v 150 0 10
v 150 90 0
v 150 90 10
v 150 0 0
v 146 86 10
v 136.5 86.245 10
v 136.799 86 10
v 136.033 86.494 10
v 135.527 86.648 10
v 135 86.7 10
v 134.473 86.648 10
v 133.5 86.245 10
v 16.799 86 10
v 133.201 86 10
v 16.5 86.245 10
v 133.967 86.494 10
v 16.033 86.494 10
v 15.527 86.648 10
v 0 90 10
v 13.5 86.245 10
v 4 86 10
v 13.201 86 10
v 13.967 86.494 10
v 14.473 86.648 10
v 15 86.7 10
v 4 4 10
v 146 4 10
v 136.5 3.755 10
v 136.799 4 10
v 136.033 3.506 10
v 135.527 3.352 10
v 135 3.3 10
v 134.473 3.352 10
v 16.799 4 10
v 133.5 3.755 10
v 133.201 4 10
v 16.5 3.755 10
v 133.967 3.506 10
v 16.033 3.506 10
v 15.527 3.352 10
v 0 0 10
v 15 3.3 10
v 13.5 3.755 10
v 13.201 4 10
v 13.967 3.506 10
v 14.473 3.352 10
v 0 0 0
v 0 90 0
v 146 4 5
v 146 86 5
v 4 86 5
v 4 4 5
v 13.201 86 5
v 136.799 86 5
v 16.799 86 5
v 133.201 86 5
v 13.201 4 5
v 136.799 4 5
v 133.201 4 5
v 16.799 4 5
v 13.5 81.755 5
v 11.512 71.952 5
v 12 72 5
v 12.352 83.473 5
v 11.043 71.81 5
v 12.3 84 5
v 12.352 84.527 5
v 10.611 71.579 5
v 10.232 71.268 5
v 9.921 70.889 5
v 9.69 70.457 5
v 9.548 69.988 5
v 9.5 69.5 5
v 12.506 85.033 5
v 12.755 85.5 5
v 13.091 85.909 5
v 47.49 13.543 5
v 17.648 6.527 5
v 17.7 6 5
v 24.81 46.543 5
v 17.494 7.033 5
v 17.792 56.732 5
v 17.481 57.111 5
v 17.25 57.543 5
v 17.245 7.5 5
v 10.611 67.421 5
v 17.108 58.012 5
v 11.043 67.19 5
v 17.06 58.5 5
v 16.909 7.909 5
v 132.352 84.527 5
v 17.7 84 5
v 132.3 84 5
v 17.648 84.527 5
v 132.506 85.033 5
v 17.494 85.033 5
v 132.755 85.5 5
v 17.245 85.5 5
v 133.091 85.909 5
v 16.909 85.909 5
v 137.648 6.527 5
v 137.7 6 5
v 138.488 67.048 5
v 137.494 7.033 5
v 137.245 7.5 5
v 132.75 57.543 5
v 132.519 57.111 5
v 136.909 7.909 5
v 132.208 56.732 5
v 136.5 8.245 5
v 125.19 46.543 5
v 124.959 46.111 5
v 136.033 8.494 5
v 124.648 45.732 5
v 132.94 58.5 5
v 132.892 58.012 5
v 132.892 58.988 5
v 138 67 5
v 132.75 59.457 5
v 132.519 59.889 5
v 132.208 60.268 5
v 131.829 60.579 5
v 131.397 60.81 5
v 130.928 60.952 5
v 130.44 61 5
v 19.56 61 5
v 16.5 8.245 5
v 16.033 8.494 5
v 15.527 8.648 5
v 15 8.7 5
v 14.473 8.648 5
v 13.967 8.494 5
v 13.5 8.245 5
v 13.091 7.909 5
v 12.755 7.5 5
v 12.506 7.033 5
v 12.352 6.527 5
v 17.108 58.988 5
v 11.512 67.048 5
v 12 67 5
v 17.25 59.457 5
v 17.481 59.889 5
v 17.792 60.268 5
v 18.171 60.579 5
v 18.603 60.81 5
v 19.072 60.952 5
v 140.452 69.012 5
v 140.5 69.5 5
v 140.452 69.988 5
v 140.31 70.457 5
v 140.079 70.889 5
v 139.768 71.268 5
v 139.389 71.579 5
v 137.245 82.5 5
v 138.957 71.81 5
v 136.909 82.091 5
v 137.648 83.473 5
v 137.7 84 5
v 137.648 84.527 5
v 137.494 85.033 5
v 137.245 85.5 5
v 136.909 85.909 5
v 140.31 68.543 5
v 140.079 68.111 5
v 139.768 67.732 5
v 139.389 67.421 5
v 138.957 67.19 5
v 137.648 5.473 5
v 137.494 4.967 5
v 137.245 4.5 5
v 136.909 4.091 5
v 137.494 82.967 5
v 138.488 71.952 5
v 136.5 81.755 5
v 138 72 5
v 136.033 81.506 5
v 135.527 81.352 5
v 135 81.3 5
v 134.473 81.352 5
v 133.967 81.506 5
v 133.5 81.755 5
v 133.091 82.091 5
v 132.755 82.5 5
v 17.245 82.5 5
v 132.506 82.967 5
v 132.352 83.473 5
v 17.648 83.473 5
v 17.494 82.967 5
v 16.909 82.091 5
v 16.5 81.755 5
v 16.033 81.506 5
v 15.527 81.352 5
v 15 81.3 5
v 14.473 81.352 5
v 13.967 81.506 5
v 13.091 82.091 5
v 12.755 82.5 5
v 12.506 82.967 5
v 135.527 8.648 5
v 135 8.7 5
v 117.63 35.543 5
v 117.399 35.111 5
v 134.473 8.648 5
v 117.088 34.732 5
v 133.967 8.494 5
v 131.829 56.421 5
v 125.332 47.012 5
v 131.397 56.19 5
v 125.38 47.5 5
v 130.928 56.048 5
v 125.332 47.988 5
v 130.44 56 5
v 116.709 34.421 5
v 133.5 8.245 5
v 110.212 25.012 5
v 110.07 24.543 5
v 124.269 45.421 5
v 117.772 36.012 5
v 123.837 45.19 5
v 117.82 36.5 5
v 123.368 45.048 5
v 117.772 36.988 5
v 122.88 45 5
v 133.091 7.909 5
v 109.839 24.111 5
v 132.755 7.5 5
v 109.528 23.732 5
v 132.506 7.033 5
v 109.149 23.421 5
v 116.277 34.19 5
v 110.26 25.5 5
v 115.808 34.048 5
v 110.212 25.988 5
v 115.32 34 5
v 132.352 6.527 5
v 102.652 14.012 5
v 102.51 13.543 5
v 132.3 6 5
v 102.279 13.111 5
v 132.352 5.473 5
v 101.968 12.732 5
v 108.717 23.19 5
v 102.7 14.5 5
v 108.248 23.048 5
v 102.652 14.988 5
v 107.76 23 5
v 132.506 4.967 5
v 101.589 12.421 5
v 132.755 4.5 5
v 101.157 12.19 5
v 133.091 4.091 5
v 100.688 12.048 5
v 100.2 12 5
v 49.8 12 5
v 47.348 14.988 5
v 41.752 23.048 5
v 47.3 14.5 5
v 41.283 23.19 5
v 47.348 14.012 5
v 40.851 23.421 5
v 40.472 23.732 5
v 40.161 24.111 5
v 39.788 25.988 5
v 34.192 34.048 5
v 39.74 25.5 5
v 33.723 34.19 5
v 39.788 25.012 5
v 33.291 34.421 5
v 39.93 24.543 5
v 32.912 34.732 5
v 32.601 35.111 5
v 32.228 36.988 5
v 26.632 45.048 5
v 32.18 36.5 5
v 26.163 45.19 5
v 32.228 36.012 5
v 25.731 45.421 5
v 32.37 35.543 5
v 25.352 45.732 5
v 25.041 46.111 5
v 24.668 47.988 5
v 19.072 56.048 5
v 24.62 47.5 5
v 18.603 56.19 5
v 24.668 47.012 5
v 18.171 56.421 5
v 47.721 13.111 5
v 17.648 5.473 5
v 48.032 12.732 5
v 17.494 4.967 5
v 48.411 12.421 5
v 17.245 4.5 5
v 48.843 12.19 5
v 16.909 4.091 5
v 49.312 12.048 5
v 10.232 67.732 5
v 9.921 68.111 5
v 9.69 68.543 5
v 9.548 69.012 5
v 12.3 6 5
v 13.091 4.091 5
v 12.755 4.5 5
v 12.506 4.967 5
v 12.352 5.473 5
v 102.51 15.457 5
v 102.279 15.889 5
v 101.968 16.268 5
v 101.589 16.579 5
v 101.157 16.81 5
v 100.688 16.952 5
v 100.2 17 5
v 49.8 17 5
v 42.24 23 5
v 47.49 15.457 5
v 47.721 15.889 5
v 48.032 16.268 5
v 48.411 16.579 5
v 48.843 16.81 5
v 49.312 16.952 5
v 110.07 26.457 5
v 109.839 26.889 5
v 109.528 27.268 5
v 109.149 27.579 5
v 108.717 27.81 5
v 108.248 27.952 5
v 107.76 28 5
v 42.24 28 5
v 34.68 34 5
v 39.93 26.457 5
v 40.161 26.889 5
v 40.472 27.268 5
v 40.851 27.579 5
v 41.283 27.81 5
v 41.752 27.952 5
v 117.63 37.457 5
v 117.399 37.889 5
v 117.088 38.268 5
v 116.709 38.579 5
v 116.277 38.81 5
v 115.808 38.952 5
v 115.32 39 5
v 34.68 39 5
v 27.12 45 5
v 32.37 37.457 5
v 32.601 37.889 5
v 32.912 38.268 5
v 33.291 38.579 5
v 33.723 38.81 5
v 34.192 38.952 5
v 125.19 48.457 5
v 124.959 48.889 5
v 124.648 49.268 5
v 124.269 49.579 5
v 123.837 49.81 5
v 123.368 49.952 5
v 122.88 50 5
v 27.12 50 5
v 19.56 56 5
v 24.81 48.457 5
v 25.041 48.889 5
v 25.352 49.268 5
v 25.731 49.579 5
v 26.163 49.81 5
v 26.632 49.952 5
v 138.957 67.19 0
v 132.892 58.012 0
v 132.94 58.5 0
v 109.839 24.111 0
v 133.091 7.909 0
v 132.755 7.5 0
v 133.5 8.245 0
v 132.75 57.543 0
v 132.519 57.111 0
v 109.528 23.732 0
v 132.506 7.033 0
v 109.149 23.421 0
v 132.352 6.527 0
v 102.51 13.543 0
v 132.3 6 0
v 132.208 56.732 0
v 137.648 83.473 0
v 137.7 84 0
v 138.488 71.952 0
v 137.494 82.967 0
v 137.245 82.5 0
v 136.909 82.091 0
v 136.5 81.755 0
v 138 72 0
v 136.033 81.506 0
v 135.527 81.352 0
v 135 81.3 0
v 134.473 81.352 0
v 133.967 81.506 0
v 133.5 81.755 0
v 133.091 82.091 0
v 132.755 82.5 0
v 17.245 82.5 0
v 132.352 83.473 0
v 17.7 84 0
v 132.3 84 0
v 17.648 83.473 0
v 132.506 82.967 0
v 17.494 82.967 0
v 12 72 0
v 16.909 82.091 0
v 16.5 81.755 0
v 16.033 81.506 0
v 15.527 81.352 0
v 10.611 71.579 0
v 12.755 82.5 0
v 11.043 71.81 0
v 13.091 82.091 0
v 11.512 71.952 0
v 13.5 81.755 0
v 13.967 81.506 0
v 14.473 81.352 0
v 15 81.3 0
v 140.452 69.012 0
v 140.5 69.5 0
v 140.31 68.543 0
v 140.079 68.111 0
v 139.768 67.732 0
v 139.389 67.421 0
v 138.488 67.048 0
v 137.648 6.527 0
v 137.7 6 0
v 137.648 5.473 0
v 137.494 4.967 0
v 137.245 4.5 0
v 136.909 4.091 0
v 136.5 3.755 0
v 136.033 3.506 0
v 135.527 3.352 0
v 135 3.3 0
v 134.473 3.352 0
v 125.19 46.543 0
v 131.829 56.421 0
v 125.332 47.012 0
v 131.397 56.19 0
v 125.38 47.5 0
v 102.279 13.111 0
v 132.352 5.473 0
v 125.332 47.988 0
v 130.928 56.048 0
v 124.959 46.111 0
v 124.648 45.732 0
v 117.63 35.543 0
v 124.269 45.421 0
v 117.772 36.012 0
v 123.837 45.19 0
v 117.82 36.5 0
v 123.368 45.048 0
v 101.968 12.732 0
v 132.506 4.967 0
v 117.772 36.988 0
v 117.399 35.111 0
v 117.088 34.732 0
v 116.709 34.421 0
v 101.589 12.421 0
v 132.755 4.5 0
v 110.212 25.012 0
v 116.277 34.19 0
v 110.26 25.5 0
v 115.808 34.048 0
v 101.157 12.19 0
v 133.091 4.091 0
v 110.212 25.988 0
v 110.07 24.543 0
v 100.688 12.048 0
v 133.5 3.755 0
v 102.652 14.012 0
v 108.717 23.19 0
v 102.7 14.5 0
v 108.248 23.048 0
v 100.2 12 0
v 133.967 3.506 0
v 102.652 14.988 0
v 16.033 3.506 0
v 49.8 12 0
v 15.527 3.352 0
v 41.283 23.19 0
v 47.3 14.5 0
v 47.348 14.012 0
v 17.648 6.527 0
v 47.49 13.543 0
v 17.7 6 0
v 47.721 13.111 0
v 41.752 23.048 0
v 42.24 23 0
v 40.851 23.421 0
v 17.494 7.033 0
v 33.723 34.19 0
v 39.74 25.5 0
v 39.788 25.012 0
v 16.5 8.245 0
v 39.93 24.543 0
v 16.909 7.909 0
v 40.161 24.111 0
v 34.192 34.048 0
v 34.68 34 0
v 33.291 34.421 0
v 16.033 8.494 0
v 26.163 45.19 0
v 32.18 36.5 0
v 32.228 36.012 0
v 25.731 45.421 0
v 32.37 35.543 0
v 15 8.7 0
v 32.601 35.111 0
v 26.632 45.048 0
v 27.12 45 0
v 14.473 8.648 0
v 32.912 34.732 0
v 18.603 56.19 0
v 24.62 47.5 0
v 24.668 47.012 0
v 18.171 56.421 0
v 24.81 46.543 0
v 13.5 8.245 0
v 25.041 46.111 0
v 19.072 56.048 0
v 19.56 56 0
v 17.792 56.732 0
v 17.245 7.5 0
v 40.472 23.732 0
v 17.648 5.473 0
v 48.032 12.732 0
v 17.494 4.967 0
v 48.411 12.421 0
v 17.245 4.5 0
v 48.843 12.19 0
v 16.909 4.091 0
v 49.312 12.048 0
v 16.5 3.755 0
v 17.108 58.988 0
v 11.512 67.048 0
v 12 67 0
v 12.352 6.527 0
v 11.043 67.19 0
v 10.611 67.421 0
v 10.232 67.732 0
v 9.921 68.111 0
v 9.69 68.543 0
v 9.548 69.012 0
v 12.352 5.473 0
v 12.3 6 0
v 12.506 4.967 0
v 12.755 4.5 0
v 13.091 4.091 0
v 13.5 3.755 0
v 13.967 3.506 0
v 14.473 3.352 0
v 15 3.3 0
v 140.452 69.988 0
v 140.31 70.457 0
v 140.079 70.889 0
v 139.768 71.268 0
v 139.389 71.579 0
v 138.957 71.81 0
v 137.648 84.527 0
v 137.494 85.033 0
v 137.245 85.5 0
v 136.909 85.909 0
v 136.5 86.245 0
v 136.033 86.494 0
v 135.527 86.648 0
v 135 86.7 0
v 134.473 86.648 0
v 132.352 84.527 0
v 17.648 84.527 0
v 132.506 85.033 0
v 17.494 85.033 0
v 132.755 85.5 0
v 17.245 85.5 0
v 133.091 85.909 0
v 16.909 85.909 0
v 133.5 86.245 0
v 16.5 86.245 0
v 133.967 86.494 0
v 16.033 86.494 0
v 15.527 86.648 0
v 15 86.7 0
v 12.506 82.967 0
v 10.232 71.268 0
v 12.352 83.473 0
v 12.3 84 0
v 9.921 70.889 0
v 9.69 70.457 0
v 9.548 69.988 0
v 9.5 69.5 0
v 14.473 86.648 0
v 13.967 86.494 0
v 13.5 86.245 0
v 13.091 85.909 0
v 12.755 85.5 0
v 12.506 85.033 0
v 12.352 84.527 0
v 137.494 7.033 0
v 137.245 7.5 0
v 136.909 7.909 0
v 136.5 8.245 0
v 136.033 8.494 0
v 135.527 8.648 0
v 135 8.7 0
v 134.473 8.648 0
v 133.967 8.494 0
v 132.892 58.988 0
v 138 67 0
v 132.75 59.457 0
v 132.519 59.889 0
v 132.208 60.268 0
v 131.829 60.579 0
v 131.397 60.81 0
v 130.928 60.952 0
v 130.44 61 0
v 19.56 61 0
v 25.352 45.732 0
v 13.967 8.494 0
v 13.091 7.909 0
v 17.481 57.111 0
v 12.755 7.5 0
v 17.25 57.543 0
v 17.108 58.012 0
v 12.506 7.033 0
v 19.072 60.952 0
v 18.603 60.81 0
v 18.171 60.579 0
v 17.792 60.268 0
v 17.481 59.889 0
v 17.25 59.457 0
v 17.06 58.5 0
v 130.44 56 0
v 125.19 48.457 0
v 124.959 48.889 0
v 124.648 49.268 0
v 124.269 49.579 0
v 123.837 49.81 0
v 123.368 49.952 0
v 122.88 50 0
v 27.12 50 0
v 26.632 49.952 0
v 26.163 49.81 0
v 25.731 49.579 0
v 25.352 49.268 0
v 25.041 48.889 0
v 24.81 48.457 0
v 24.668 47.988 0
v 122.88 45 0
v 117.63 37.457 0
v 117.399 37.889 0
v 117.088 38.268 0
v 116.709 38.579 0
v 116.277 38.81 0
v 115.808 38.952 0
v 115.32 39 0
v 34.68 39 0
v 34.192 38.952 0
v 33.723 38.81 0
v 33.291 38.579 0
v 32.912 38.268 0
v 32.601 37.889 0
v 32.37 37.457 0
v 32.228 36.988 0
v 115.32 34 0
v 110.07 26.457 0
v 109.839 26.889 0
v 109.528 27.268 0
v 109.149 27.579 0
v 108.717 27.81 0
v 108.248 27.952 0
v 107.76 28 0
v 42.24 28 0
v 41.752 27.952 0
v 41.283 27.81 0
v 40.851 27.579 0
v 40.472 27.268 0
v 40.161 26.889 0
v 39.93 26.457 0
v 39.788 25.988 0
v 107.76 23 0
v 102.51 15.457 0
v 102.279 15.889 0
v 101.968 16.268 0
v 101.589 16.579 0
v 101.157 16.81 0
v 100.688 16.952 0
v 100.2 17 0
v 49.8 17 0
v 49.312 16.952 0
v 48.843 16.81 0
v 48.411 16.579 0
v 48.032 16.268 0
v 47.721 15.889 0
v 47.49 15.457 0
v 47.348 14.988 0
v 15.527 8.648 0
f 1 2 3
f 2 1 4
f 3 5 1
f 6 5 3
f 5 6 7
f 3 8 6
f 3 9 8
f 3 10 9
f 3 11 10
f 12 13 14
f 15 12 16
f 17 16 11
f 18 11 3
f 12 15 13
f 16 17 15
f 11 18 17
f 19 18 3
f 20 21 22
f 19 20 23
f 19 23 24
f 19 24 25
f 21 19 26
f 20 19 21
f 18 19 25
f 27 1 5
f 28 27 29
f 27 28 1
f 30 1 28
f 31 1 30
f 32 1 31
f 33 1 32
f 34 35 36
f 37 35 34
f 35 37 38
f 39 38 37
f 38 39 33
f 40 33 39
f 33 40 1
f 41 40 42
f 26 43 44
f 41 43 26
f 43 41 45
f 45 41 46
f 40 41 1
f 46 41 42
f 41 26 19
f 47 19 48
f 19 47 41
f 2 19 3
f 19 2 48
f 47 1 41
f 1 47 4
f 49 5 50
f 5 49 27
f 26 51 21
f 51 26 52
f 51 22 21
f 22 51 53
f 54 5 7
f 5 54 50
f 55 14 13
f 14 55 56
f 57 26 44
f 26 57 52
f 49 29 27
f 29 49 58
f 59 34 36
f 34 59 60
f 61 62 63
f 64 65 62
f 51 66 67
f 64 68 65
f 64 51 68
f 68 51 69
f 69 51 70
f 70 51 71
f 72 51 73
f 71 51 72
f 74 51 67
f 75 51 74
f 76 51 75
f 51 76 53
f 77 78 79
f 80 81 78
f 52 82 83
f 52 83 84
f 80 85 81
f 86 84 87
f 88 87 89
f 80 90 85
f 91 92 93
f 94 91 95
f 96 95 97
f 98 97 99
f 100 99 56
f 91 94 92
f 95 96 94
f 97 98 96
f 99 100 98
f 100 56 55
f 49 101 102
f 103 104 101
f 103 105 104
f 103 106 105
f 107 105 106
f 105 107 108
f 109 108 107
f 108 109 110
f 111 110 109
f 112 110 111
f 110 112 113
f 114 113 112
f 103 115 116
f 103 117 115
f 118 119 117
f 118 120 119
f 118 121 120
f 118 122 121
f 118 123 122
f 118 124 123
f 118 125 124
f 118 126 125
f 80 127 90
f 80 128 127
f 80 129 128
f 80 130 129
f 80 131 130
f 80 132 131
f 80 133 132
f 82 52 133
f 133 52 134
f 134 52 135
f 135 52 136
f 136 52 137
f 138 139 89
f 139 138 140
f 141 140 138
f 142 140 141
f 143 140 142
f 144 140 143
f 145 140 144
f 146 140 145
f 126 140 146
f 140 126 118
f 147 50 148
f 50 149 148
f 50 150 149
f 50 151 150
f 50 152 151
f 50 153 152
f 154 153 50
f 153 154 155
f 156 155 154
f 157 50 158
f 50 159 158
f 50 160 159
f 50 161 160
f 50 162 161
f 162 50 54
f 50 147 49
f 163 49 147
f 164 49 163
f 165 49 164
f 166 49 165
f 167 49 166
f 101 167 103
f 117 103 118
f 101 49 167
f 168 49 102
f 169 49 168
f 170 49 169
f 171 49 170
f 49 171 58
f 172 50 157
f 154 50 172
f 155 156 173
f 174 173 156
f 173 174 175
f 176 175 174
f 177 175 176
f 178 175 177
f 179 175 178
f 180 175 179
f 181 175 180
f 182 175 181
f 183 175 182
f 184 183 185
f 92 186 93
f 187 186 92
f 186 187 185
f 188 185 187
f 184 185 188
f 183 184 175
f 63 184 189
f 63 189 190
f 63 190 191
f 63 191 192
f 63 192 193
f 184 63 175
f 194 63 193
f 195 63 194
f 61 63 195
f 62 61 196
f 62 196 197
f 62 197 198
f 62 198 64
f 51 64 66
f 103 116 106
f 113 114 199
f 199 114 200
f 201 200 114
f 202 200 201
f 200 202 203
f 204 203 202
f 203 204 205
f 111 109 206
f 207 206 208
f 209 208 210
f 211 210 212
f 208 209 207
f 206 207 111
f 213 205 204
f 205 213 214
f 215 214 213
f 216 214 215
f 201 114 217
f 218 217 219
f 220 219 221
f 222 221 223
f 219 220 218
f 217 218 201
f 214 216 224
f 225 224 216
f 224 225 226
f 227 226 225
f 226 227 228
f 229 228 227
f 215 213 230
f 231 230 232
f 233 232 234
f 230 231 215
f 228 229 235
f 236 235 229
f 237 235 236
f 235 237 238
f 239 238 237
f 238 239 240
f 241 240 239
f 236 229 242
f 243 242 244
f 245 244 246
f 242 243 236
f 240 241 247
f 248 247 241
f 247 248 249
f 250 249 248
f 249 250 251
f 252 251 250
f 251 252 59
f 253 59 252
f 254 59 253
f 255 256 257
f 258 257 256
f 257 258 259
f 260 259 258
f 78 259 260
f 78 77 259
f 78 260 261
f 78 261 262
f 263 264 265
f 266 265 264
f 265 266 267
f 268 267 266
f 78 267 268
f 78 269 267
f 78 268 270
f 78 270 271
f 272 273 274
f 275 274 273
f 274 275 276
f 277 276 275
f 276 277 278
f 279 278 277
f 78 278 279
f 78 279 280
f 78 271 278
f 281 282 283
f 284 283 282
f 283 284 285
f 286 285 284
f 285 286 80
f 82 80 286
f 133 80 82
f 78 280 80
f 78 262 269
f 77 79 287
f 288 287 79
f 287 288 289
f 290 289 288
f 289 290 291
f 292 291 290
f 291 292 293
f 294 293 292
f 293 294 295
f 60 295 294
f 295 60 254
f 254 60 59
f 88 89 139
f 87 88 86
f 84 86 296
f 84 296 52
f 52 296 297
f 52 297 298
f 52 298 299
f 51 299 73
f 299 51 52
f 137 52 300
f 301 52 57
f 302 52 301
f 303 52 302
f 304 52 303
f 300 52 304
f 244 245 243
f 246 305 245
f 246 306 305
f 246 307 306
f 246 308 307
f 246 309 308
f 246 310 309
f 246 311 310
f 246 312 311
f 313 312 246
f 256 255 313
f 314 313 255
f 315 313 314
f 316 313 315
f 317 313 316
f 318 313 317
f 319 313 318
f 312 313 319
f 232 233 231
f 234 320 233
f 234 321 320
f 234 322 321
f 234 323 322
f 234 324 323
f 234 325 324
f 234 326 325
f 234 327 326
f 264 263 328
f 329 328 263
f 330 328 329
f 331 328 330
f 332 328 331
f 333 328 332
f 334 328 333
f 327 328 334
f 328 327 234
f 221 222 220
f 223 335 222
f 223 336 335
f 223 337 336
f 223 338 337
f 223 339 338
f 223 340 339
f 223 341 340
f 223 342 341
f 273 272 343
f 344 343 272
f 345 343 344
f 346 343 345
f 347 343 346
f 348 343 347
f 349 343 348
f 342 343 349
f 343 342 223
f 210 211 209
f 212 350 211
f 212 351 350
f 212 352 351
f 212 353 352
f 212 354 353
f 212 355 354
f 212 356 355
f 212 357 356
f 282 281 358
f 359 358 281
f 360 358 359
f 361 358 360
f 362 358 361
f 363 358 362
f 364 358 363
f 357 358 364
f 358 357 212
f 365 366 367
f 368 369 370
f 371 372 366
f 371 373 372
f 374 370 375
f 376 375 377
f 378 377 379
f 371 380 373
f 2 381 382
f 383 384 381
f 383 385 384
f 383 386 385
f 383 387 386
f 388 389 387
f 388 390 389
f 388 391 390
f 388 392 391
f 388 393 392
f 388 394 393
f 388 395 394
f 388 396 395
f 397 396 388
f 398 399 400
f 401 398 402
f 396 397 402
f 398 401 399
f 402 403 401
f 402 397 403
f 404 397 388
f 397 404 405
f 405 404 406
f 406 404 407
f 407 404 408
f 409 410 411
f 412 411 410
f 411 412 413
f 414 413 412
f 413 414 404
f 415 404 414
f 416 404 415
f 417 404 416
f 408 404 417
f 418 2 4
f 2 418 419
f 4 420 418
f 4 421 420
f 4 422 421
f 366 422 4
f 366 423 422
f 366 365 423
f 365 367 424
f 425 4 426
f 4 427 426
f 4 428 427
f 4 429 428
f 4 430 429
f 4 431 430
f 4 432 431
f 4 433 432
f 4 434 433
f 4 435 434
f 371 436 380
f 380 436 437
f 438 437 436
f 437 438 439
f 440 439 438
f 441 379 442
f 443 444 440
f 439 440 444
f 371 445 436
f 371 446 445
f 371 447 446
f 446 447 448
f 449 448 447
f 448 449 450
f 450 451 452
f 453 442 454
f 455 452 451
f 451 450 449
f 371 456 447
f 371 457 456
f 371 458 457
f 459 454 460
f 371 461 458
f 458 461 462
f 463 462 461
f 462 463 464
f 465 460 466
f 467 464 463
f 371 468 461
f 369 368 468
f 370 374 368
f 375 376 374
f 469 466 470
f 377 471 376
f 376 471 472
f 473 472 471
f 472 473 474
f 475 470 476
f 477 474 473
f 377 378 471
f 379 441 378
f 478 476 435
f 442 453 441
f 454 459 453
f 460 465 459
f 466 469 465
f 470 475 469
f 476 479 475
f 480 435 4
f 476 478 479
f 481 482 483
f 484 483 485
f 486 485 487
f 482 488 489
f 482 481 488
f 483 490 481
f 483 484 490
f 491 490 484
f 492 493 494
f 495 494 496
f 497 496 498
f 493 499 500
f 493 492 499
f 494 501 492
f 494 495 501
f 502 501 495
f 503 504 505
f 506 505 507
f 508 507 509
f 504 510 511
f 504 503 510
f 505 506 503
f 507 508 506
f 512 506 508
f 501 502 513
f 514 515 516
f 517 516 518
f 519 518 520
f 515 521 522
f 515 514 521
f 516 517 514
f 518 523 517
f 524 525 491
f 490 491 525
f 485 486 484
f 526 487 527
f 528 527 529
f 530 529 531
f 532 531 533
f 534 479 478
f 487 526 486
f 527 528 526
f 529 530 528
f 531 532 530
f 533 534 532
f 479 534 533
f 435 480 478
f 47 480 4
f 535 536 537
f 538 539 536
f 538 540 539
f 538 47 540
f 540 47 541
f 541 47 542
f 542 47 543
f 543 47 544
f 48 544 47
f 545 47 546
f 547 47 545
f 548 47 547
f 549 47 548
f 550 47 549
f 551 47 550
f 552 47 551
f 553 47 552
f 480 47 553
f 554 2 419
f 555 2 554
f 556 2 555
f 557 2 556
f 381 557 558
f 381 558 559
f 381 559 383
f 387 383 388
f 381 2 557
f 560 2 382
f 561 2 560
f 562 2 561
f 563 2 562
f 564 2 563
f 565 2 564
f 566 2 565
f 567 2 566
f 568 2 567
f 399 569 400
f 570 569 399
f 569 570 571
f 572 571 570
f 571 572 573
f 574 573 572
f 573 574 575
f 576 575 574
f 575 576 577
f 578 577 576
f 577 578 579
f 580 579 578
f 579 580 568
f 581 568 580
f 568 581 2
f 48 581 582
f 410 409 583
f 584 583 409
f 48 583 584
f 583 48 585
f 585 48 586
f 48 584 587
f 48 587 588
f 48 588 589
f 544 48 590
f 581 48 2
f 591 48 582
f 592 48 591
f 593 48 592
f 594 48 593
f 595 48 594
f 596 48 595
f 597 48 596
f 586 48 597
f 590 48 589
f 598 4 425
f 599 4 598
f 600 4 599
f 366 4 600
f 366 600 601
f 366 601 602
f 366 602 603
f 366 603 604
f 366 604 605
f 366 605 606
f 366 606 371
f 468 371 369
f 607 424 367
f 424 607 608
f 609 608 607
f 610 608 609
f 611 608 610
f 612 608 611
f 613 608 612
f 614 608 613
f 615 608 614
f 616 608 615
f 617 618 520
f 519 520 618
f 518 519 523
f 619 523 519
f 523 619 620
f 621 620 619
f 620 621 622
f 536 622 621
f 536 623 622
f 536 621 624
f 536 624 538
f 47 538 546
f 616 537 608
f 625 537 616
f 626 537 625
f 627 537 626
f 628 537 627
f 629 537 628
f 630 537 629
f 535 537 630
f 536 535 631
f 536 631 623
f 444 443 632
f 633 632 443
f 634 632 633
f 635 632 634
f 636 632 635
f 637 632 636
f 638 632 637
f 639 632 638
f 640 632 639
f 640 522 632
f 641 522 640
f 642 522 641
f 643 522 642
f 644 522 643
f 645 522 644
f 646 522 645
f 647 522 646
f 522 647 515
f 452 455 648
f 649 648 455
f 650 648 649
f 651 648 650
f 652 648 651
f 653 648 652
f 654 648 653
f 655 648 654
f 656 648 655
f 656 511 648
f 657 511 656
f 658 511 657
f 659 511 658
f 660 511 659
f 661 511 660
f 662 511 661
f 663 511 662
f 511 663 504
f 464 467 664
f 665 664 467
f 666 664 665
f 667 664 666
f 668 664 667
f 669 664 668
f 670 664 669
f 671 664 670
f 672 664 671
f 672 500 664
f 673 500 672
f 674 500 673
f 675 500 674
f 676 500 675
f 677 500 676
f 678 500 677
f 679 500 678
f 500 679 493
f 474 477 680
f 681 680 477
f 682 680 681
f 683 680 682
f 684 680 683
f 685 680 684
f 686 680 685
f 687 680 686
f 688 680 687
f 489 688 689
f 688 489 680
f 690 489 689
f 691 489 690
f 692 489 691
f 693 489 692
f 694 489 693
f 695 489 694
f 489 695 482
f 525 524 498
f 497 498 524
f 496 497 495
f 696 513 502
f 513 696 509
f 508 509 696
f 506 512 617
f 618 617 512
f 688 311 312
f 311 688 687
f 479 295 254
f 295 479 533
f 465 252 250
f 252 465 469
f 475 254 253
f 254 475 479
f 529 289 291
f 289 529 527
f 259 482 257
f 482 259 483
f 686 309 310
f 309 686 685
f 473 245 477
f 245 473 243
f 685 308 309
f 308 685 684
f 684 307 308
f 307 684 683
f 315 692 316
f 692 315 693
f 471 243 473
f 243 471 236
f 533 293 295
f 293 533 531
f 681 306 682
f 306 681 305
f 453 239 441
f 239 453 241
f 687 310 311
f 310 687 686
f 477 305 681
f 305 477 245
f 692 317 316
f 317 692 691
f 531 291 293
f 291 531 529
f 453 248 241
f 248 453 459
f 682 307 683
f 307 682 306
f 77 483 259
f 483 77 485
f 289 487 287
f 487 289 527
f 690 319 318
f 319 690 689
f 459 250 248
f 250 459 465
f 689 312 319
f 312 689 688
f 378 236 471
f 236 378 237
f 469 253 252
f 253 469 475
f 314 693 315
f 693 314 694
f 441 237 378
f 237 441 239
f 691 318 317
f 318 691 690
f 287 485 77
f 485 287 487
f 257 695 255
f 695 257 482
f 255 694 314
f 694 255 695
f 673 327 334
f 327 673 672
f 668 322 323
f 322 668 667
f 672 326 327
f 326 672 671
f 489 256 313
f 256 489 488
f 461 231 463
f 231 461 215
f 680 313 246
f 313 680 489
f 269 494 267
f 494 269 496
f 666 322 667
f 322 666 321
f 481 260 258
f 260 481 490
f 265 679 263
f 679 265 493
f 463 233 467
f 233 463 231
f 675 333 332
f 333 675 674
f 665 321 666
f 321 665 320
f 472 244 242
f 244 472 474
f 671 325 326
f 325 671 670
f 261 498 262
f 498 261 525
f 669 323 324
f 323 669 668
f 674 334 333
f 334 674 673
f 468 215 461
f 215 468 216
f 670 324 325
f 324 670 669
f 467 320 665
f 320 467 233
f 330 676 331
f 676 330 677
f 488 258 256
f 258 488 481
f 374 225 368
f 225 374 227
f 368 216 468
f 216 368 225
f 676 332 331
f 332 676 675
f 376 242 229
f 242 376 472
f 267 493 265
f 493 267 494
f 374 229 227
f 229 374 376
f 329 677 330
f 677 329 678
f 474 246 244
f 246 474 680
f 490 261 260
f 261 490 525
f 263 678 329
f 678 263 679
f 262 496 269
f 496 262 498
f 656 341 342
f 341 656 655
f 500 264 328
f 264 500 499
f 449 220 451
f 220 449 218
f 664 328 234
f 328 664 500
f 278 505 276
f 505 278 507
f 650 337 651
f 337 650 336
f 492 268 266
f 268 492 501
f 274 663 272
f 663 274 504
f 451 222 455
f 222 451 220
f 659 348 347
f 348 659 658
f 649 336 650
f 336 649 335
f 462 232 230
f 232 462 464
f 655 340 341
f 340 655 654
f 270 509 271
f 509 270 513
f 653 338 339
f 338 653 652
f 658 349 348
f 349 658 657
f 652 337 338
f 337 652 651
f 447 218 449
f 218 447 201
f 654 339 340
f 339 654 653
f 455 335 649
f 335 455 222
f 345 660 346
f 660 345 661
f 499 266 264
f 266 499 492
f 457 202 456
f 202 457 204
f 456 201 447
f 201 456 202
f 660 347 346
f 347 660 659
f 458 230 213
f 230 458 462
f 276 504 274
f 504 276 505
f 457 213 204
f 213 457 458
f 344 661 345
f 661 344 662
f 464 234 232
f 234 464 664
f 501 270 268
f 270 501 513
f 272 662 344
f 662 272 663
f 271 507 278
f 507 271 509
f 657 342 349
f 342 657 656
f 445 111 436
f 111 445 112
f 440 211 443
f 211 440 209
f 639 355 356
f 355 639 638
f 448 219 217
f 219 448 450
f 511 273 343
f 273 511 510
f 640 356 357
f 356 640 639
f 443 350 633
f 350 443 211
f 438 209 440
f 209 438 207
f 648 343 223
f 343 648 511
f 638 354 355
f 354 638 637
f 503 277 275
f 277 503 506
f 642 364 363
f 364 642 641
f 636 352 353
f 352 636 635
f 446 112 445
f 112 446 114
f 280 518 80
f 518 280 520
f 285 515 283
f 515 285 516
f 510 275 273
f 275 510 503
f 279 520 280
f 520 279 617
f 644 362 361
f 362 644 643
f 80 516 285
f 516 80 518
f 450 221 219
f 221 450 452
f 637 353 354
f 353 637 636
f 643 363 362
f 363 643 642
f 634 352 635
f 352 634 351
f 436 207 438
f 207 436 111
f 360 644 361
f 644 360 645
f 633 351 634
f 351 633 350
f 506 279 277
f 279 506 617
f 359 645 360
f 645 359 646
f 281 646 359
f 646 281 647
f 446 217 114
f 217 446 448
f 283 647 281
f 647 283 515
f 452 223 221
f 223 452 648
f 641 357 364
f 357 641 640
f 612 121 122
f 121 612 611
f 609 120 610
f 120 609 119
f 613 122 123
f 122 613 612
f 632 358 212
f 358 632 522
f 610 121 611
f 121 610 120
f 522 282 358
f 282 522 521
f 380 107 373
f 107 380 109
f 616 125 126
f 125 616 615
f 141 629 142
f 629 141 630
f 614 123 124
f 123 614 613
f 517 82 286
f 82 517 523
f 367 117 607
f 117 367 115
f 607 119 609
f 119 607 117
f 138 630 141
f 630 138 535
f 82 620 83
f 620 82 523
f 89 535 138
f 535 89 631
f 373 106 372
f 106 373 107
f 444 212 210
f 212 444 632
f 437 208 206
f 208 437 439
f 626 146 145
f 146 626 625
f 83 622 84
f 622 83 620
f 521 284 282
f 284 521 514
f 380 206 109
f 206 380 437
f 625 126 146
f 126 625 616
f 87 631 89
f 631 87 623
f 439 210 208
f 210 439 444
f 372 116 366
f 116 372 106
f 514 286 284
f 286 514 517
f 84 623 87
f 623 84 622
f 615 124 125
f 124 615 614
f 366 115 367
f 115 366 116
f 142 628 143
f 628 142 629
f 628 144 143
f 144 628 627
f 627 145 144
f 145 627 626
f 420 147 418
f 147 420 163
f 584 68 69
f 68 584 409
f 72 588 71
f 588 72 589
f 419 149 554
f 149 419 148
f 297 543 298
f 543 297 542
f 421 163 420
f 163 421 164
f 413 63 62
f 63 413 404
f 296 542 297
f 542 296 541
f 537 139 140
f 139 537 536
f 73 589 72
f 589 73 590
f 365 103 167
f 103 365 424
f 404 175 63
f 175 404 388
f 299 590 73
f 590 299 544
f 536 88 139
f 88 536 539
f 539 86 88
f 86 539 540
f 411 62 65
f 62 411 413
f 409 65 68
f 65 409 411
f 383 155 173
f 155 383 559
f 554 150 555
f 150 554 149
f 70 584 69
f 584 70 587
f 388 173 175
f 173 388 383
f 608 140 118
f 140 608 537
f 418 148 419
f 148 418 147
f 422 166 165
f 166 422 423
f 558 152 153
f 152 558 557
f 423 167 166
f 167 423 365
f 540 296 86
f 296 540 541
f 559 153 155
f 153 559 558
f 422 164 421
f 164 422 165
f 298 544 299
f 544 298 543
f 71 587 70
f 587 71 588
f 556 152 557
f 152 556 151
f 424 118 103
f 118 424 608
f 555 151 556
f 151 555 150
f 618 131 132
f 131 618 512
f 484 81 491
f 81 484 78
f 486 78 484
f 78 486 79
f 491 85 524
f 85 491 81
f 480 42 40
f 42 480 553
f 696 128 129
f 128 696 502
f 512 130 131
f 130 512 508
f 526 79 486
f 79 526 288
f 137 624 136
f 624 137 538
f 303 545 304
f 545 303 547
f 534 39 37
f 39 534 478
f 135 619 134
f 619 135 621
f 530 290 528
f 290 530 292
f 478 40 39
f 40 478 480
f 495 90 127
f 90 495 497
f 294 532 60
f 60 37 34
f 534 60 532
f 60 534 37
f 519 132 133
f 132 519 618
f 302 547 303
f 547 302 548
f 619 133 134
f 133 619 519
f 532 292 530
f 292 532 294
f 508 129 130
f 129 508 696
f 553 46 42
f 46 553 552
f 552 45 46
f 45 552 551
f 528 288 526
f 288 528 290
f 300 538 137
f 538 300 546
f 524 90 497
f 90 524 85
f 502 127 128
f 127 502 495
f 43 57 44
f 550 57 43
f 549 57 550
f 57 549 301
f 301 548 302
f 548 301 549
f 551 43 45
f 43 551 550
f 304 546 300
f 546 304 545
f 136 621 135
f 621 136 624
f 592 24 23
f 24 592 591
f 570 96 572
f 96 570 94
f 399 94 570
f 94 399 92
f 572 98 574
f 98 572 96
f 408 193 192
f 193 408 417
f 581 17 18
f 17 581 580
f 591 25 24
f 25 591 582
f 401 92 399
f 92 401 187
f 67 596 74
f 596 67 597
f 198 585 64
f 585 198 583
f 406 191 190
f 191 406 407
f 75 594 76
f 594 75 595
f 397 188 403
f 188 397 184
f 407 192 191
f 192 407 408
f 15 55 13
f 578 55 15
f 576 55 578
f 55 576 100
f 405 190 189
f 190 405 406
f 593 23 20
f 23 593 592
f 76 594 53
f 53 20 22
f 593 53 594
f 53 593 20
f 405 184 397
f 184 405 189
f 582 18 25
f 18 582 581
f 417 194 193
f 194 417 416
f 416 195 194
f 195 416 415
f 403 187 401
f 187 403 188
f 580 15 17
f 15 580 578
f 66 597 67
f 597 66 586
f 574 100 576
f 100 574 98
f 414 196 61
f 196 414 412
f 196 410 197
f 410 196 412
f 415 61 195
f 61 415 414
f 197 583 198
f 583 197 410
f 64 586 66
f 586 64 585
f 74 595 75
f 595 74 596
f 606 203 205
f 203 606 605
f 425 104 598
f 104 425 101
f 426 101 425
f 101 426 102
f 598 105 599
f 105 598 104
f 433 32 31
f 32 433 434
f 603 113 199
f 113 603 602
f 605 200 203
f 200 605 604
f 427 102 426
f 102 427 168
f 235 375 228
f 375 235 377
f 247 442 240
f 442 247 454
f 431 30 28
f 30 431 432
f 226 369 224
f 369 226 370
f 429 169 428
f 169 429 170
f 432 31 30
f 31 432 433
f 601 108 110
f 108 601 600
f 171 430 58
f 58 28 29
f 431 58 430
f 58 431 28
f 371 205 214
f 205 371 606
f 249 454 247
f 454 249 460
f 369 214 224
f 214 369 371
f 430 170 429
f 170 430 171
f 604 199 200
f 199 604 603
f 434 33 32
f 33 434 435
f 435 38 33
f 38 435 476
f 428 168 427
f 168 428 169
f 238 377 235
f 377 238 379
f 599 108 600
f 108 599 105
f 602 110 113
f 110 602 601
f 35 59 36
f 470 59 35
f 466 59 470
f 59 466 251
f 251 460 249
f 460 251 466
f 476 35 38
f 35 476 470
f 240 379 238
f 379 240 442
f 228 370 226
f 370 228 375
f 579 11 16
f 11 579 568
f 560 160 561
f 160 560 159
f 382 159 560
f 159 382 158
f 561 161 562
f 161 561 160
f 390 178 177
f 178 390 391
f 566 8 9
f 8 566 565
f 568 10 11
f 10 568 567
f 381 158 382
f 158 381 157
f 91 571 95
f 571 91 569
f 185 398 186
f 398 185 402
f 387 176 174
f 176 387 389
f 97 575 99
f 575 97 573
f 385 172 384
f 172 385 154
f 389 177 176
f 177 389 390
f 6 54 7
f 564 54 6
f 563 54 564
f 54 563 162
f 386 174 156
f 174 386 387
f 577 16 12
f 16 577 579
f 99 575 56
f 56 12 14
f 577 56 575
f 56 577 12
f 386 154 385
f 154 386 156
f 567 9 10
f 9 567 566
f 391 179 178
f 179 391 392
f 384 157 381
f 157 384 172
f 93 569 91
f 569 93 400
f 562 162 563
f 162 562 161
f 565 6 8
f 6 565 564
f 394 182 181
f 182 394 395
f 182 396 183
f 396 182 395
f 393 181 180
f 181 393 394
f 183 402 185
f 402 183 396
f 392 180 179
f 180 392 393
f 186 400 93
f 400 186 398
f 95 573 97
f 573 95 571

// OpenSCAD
$fn = 32;

// ----------------------------------------------------------------------
// Slotted panel: 150 x 90 mm, 6 рядов of slots
// ----------------------------------------------------------------------

// --- parameters (mm) ---
panel_w = 150;            // panel width
panel_d = 90;             // panel depth
thick = 5;                // panel thickness
slot_w = 5;               // slot width
pitch0 = 11;              // first row pitch
pitch_step = 1.8;         // pitch increase per row
margin = 12;              // margin around the slot field
rows = 6;                 // number of slot rows
mount_d = 5.4;            // mounting holes
mount_x = 60;             // mounting hole offset
rim_h = 10;               // rim height
rim_t = 4;                // rim wall thickness

difference() {
  union() {
    cube([panel_w, panel_d, thick]);
    translate([0, 0, thick - 1]) difference() {
      cube([panel_w, panel_d, rim_h - thick + 1]);
      translate([rim_t, rim_t, -2.5]) cube([panel_w - 2 * rim_t, panel_d - 2 * rim_t, rim_h - thick + 6]);
    }
  }
  /* slot rows: stadium shaped cutters, 2.5 mm clear of both faces */
  /* row 0: pitch 11, length 50.4 */
  hull() {
    translate([49.8, 14.5, -2.5]) cylinder(h = thick + 5, d = slot_w);
    translate([100.2, 14.5, -2.5]) cylinder(h = thick + 5, d = slot_w);
  }
  /* row 1: pitch 11, length 65.52 */
  hull() {
    translate([42.24, 25.5, -2.5]) cylinder(h = thick + 5, d = slot_w);
    translate([107.76, 25.5, -2.5]) cylinder(h = thick + 5, d = slot_w);
  }
  /* row 2: pitch 11, length 80.64 */
  hull() {
    translate([34.68, 36.5, -2.5]) cylinder(h = thick + 5, d = slot_w);
    translate([115.32, 36.5, -2.5]) cylinder(h = thick + 5, d = slot_w);
  }
  /* row 3: pitch 11, length 95.76 */
  hull() {
    translate([27.12, 47.5, -2.5]) cylinder(h = thick + 5, d = slot_w);
    translate([122.88, 47.5, -2.5]) cylinder(h = thick + 5, d = slot_w);
  }
  /* row 4: pitch 11, length 110.88 */
  hull() {
    translate([19.56, 58.5, -2.5]) cylinder(h = thick + 5, d = slot_w);
    translate([130.44, 58.5, -2.5]) cylinder(h = thick + 5, d = slot_w);
  }
  /* row 5: pitch 11, length 126 */
  hull() {
    translate([12, 69.5, -2.5]) cylinder(h = thick + 5, d = slot_w);
    translate([138, 69.5, -2.5]) cylinder(h = thick + 5, d = slot_w);
  }
  translate([15, 6, -2.5]) cylinder(h = 15, d = mount_d);
  translate([15, 84, -2.5]) cylinder(h = 15, d = mount_d);
  translate([135, 6, -2.5]) cylinder(h = 15, d = mount_d);
  translate([135, 84, -2.5]) cylinder(h = 15, d = mount_d);
}
